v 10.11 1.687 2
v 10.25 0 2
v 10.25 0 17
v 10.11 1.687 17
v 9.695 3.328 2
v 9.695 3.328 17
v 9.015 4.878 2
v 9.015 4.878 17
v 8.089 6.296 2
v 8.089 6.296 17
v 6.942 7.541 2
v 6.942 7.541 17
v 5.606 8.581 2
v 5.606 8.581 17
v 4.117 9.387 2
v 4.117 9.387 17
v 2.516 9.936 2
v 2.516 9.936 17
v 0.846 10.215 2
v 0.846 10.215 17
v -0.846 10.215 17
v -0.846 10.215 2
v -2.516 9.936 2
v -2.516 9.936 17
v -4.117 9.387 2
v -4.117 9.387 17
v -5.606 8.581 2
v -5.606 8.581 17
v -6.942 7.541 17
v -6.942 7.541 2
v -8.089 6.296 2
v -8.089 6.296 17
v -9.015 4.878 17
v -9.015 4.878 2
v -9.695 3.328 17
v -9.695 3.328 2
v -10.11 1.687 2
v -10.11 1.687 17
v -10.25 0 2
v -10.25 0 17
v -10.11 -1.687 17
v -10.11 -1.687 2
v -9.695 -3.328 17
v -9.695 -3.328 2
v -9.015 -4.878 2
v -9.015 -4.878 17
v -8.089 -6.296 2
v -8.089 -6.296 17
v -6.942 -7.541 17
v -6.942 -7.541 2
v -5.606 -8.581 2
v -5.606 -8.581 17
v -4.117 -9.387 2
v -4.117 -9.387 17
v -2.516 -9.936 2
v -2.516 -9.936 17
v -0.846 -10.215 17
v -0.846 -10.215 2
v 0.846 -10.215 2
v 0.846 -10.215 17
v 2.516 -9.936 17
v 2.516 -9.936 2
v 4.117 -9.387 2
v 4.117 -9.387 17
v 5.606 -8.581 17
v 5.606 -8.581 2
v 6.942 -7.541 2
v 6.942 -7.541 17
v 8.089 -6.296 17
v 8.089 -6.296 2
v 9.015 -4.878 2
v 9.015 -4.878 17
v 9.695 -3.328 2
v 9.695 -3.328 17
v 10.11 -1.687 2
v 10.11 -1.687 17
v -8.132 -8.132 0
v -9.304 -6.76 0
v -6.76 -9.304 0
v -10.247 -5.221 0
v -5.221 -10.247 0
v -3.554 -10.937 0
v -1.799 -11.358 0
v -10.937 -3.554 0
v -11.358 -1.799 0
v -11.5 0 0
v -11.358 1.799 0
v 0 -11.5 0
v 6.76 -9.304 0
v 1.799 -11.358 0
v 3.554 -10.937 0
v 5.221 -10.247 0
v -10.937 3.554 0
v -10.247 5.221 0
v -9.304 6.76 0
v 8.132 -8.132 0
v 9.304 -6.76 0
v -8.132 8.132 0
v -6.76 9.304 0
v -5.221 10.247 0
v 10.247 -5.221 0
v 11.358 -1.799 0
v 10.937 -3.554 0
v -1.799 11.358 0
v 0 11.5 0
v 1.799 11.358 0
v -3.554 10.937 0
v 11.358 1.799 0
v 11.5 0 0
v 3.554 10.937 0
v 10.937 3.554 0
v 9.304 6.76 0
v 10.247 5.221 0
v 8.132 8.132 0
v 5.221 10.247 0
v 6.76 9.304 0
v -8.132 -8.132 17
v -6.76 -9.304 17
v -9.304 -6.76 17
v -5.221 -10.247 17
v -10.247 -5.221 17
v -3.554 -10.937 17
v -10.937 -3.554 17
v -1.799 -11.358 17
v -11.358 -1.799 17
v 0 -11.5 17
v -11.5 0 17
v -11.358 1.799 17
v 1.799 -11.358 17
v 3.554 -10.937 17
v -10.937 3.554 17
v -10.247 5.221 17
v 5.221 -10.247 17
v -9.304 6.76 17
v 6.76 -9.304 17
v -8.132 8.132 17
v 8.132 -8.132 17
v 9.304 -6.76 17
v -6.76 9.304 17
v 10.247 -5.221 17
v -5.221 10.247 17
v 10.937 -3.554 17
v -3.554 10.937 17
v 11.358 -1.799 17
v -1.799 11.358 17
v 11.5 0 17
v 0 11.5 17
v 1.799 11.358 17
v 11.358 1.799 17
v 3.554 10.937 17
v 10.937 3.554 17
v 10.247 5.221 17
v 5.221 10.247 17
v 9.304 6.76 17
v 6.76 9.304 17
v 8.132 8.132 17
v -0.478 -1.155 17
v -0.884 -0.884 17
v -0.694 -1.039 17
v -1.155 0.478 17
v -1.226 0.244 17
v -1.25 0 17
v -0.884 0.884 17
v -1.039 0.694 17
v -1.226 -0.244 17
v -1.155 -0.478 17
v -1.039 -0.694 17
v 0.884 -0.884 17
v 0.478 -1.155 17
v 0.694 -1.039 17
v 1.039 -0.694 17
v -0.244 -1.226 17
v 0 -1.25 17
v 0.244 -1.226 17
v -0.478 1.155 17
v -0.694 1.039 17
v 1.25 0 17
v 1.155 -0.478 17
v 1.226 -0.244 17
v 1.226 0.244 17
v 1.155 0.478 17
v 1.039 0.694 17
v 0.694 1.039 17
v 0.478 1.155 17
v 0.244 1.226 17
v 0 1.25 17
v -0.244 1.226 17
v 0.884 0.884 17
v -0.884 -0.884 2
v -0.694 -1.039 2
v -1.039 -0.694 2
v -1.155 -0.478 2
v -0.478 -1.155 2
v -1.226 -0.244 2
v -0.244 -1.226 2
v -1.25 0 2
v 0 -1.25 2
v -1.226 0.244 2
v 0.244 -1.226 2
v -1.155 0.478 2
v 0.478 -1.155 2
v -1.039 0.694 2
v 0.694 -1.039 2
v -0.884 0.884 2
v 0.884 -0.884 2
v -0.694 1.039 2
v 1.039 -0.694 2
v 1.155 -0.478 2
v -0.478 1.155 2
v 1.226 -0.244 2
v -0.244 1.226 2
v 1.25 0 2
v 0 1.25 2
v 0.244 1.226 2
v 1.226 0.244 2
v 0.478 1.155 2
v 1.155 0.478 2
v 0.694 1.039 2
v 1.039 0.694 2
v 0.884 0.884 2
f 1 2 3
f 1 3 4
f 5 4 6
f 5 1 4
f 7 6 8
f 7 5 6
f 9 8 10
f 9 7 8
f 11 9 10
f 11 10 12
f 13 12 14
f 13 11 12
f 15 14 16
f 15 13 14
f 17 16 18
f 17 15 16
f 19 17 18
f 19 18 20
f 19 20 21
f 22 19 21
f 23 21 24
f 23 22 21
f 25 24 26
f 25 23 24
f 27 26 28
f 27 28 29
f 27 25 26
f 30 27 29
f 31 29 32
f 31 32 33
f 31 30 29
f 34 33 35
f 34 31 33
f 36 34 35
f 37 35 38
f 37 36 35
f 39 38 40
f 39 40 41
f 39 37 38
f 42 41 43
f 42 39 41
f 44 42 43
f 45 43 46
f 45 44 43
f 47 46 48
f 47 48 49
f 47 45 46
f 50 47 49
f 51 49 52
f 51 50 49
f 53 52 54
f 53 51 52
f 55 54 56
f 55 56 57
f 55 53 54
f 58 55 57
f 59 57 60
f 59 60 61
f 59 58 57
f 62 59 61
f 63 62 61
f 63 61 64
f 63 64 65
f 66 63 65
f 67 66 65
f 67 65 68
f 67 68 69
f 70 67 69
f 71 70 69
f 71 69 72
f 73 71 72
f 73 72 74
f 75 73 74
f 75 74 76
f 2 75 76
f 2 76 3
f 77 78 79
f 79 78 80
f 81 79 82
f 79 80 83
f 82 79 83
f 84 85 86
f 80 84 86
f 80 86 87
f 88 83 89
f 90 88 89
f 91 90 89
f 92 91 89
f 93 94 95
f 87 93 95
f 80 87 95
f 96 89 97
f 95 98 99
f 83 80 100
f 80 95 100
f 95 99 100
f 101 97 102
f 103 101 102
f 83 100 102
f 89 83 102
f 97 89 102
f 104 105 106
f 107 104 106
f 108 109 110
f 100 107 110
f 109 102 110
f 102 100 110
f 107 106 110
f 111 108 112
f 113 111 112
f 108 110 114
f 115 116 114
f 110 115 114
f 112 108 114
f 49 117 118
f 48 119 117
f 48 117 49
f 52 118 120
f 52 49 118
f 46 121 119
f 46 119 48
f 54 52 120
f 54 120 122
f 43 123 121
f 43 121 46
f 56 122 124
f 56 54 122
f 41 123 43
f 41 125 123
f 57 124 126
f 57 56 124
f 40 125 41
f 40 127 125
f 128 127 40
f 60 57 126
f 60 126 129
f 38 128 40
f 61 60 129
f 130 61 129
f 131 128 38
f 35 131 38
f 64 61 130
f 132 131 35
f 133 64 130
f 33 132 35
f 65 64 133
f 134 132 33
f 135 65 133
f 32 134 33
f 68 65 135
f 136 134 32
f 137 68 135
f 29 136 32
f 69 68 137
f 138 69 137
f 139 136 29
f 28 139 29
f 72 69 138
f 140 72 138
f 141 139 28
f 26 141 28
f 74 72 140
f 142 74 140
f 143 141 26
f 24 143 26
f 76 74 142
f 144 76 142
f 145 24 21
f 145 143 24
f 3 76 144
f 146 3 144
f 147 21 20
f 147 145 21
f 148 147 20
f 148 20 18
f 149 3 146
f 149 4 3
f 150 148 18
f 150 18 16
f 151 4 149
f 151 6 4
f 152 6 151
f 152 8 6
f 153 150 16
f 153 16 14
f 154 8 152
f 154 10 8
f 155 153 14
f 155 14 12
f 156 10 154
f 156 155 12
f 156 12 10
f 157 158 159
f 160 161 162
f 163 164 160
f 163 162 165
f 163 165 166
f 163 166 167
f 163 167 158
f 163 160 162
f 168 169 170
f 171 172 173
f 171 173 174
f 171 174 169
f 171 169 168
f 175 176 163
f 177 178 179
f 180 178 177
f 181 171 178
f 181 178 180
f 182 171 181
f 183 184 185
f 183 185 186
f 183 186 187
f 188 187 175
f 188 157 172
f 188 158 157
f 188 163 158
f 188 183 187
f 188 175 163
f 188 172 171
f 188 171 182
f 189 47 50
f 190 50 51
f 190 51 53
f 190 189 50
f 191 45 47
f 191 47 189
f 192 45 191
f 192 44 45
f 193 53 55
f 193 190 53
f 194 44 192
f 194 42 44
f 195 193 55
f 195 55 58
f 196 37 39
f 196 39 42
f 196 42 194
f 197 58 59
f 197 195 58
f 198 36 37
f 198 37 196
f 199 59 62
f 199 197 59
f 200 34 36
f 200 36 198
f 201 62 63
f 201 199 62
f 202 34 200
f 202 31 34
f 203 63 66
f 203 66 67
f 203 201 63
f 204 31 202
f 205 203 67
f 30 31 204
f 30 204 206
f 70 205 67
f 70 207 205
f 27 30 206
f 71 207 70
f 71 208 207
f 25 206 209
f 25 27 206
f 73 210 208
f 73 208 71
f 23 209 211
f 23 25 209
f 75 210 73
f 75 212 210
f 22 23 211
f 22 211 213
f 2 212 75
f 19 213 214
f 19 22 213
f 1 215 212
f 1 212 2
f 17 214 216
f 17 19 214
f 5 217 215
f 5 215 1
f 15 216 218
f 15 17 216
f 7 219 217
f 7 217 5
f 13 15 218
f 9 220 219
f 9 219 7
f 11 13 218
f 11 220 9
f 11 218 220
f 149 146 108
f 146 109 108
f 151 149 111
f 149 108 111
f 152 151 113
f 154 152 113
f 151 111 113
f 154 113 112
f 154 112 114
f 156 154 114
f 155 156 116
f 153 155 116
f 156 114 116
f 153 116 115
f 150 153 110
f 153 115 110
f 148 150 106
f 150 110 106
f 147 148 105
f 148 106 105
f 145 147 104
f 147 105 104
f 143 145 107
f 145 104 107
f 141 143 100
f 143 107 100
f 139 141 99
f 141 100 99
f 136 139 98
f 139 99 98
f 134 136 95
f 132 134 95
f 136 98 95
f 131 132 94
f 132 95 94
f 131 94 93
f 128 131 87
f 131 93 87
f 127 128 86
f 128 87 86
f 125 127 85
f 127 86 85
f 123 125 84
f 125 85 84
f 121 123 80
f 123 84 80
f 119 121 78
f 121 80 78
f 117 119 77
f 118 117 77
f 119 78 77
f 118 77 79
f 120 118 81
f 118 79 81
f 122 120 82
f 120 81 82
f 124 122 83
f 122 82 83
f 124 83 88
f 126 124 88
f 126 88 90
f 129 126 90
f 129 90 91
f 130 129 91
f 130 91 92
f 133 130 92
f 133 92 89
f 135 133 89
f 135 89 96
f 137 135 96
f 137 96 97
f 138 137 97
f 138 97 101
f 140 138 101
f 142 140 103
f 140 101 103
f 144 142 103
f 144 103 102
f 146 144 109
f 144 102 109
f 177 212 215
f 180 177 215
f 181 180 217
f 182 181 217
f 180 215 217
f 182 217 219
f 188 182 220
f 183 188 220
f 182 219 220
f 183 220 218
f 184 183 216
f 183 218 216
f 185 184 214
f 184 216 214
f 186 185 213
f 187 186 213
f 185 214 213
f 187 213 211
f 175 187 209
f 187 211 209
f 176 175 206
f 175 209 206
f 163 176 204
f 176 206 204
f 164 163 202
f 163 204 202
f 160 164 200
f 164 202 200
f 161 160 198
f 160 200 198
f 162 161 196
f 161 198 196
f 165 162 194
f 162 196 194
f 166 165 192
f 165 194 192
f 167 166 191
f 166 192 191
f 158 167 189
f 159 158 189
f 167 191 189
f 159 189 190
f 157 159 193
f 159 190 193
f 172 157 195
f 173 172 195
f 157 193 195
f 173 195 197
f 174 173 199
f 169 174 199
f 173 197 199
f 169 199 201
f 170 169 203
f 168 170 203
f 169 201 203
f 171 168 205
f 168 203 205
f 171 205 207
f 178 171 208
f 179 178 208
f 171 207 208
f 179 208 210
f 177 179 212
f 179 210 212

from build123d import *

# Parameters (mm, degrees)
F0_R     = 11.5
F1_DEPTH = 2
F2_R     = 11.5
F2_R_2   = 10.25
F3_DEPTH = 15
F4_R     = 1.25
F5_DEPTH = 15


with BuildPart() as f1:
    # F0 (on Top) → F1 (new body)
    with BuildSketch(Plane.XY):
        Circle(F0_R)
    extrude(amount=F1_DEPTH)

    # F2 (on face) → F3 (join)
    with BuildSketch(Plane.XY.offset(2)):
        Circle(F2_R)
        Circle(F2_R_2, mode=Mode.SUBTRACT)
    extrude(amount=F3_DEPTH)

    # F4 (on face) → F5 (join)
    with BuildSketch(Plane.XY.offset(2)):
        Circle(F4_R)
    extrude(amount=F5_DEPTH)


solid = f1.part
